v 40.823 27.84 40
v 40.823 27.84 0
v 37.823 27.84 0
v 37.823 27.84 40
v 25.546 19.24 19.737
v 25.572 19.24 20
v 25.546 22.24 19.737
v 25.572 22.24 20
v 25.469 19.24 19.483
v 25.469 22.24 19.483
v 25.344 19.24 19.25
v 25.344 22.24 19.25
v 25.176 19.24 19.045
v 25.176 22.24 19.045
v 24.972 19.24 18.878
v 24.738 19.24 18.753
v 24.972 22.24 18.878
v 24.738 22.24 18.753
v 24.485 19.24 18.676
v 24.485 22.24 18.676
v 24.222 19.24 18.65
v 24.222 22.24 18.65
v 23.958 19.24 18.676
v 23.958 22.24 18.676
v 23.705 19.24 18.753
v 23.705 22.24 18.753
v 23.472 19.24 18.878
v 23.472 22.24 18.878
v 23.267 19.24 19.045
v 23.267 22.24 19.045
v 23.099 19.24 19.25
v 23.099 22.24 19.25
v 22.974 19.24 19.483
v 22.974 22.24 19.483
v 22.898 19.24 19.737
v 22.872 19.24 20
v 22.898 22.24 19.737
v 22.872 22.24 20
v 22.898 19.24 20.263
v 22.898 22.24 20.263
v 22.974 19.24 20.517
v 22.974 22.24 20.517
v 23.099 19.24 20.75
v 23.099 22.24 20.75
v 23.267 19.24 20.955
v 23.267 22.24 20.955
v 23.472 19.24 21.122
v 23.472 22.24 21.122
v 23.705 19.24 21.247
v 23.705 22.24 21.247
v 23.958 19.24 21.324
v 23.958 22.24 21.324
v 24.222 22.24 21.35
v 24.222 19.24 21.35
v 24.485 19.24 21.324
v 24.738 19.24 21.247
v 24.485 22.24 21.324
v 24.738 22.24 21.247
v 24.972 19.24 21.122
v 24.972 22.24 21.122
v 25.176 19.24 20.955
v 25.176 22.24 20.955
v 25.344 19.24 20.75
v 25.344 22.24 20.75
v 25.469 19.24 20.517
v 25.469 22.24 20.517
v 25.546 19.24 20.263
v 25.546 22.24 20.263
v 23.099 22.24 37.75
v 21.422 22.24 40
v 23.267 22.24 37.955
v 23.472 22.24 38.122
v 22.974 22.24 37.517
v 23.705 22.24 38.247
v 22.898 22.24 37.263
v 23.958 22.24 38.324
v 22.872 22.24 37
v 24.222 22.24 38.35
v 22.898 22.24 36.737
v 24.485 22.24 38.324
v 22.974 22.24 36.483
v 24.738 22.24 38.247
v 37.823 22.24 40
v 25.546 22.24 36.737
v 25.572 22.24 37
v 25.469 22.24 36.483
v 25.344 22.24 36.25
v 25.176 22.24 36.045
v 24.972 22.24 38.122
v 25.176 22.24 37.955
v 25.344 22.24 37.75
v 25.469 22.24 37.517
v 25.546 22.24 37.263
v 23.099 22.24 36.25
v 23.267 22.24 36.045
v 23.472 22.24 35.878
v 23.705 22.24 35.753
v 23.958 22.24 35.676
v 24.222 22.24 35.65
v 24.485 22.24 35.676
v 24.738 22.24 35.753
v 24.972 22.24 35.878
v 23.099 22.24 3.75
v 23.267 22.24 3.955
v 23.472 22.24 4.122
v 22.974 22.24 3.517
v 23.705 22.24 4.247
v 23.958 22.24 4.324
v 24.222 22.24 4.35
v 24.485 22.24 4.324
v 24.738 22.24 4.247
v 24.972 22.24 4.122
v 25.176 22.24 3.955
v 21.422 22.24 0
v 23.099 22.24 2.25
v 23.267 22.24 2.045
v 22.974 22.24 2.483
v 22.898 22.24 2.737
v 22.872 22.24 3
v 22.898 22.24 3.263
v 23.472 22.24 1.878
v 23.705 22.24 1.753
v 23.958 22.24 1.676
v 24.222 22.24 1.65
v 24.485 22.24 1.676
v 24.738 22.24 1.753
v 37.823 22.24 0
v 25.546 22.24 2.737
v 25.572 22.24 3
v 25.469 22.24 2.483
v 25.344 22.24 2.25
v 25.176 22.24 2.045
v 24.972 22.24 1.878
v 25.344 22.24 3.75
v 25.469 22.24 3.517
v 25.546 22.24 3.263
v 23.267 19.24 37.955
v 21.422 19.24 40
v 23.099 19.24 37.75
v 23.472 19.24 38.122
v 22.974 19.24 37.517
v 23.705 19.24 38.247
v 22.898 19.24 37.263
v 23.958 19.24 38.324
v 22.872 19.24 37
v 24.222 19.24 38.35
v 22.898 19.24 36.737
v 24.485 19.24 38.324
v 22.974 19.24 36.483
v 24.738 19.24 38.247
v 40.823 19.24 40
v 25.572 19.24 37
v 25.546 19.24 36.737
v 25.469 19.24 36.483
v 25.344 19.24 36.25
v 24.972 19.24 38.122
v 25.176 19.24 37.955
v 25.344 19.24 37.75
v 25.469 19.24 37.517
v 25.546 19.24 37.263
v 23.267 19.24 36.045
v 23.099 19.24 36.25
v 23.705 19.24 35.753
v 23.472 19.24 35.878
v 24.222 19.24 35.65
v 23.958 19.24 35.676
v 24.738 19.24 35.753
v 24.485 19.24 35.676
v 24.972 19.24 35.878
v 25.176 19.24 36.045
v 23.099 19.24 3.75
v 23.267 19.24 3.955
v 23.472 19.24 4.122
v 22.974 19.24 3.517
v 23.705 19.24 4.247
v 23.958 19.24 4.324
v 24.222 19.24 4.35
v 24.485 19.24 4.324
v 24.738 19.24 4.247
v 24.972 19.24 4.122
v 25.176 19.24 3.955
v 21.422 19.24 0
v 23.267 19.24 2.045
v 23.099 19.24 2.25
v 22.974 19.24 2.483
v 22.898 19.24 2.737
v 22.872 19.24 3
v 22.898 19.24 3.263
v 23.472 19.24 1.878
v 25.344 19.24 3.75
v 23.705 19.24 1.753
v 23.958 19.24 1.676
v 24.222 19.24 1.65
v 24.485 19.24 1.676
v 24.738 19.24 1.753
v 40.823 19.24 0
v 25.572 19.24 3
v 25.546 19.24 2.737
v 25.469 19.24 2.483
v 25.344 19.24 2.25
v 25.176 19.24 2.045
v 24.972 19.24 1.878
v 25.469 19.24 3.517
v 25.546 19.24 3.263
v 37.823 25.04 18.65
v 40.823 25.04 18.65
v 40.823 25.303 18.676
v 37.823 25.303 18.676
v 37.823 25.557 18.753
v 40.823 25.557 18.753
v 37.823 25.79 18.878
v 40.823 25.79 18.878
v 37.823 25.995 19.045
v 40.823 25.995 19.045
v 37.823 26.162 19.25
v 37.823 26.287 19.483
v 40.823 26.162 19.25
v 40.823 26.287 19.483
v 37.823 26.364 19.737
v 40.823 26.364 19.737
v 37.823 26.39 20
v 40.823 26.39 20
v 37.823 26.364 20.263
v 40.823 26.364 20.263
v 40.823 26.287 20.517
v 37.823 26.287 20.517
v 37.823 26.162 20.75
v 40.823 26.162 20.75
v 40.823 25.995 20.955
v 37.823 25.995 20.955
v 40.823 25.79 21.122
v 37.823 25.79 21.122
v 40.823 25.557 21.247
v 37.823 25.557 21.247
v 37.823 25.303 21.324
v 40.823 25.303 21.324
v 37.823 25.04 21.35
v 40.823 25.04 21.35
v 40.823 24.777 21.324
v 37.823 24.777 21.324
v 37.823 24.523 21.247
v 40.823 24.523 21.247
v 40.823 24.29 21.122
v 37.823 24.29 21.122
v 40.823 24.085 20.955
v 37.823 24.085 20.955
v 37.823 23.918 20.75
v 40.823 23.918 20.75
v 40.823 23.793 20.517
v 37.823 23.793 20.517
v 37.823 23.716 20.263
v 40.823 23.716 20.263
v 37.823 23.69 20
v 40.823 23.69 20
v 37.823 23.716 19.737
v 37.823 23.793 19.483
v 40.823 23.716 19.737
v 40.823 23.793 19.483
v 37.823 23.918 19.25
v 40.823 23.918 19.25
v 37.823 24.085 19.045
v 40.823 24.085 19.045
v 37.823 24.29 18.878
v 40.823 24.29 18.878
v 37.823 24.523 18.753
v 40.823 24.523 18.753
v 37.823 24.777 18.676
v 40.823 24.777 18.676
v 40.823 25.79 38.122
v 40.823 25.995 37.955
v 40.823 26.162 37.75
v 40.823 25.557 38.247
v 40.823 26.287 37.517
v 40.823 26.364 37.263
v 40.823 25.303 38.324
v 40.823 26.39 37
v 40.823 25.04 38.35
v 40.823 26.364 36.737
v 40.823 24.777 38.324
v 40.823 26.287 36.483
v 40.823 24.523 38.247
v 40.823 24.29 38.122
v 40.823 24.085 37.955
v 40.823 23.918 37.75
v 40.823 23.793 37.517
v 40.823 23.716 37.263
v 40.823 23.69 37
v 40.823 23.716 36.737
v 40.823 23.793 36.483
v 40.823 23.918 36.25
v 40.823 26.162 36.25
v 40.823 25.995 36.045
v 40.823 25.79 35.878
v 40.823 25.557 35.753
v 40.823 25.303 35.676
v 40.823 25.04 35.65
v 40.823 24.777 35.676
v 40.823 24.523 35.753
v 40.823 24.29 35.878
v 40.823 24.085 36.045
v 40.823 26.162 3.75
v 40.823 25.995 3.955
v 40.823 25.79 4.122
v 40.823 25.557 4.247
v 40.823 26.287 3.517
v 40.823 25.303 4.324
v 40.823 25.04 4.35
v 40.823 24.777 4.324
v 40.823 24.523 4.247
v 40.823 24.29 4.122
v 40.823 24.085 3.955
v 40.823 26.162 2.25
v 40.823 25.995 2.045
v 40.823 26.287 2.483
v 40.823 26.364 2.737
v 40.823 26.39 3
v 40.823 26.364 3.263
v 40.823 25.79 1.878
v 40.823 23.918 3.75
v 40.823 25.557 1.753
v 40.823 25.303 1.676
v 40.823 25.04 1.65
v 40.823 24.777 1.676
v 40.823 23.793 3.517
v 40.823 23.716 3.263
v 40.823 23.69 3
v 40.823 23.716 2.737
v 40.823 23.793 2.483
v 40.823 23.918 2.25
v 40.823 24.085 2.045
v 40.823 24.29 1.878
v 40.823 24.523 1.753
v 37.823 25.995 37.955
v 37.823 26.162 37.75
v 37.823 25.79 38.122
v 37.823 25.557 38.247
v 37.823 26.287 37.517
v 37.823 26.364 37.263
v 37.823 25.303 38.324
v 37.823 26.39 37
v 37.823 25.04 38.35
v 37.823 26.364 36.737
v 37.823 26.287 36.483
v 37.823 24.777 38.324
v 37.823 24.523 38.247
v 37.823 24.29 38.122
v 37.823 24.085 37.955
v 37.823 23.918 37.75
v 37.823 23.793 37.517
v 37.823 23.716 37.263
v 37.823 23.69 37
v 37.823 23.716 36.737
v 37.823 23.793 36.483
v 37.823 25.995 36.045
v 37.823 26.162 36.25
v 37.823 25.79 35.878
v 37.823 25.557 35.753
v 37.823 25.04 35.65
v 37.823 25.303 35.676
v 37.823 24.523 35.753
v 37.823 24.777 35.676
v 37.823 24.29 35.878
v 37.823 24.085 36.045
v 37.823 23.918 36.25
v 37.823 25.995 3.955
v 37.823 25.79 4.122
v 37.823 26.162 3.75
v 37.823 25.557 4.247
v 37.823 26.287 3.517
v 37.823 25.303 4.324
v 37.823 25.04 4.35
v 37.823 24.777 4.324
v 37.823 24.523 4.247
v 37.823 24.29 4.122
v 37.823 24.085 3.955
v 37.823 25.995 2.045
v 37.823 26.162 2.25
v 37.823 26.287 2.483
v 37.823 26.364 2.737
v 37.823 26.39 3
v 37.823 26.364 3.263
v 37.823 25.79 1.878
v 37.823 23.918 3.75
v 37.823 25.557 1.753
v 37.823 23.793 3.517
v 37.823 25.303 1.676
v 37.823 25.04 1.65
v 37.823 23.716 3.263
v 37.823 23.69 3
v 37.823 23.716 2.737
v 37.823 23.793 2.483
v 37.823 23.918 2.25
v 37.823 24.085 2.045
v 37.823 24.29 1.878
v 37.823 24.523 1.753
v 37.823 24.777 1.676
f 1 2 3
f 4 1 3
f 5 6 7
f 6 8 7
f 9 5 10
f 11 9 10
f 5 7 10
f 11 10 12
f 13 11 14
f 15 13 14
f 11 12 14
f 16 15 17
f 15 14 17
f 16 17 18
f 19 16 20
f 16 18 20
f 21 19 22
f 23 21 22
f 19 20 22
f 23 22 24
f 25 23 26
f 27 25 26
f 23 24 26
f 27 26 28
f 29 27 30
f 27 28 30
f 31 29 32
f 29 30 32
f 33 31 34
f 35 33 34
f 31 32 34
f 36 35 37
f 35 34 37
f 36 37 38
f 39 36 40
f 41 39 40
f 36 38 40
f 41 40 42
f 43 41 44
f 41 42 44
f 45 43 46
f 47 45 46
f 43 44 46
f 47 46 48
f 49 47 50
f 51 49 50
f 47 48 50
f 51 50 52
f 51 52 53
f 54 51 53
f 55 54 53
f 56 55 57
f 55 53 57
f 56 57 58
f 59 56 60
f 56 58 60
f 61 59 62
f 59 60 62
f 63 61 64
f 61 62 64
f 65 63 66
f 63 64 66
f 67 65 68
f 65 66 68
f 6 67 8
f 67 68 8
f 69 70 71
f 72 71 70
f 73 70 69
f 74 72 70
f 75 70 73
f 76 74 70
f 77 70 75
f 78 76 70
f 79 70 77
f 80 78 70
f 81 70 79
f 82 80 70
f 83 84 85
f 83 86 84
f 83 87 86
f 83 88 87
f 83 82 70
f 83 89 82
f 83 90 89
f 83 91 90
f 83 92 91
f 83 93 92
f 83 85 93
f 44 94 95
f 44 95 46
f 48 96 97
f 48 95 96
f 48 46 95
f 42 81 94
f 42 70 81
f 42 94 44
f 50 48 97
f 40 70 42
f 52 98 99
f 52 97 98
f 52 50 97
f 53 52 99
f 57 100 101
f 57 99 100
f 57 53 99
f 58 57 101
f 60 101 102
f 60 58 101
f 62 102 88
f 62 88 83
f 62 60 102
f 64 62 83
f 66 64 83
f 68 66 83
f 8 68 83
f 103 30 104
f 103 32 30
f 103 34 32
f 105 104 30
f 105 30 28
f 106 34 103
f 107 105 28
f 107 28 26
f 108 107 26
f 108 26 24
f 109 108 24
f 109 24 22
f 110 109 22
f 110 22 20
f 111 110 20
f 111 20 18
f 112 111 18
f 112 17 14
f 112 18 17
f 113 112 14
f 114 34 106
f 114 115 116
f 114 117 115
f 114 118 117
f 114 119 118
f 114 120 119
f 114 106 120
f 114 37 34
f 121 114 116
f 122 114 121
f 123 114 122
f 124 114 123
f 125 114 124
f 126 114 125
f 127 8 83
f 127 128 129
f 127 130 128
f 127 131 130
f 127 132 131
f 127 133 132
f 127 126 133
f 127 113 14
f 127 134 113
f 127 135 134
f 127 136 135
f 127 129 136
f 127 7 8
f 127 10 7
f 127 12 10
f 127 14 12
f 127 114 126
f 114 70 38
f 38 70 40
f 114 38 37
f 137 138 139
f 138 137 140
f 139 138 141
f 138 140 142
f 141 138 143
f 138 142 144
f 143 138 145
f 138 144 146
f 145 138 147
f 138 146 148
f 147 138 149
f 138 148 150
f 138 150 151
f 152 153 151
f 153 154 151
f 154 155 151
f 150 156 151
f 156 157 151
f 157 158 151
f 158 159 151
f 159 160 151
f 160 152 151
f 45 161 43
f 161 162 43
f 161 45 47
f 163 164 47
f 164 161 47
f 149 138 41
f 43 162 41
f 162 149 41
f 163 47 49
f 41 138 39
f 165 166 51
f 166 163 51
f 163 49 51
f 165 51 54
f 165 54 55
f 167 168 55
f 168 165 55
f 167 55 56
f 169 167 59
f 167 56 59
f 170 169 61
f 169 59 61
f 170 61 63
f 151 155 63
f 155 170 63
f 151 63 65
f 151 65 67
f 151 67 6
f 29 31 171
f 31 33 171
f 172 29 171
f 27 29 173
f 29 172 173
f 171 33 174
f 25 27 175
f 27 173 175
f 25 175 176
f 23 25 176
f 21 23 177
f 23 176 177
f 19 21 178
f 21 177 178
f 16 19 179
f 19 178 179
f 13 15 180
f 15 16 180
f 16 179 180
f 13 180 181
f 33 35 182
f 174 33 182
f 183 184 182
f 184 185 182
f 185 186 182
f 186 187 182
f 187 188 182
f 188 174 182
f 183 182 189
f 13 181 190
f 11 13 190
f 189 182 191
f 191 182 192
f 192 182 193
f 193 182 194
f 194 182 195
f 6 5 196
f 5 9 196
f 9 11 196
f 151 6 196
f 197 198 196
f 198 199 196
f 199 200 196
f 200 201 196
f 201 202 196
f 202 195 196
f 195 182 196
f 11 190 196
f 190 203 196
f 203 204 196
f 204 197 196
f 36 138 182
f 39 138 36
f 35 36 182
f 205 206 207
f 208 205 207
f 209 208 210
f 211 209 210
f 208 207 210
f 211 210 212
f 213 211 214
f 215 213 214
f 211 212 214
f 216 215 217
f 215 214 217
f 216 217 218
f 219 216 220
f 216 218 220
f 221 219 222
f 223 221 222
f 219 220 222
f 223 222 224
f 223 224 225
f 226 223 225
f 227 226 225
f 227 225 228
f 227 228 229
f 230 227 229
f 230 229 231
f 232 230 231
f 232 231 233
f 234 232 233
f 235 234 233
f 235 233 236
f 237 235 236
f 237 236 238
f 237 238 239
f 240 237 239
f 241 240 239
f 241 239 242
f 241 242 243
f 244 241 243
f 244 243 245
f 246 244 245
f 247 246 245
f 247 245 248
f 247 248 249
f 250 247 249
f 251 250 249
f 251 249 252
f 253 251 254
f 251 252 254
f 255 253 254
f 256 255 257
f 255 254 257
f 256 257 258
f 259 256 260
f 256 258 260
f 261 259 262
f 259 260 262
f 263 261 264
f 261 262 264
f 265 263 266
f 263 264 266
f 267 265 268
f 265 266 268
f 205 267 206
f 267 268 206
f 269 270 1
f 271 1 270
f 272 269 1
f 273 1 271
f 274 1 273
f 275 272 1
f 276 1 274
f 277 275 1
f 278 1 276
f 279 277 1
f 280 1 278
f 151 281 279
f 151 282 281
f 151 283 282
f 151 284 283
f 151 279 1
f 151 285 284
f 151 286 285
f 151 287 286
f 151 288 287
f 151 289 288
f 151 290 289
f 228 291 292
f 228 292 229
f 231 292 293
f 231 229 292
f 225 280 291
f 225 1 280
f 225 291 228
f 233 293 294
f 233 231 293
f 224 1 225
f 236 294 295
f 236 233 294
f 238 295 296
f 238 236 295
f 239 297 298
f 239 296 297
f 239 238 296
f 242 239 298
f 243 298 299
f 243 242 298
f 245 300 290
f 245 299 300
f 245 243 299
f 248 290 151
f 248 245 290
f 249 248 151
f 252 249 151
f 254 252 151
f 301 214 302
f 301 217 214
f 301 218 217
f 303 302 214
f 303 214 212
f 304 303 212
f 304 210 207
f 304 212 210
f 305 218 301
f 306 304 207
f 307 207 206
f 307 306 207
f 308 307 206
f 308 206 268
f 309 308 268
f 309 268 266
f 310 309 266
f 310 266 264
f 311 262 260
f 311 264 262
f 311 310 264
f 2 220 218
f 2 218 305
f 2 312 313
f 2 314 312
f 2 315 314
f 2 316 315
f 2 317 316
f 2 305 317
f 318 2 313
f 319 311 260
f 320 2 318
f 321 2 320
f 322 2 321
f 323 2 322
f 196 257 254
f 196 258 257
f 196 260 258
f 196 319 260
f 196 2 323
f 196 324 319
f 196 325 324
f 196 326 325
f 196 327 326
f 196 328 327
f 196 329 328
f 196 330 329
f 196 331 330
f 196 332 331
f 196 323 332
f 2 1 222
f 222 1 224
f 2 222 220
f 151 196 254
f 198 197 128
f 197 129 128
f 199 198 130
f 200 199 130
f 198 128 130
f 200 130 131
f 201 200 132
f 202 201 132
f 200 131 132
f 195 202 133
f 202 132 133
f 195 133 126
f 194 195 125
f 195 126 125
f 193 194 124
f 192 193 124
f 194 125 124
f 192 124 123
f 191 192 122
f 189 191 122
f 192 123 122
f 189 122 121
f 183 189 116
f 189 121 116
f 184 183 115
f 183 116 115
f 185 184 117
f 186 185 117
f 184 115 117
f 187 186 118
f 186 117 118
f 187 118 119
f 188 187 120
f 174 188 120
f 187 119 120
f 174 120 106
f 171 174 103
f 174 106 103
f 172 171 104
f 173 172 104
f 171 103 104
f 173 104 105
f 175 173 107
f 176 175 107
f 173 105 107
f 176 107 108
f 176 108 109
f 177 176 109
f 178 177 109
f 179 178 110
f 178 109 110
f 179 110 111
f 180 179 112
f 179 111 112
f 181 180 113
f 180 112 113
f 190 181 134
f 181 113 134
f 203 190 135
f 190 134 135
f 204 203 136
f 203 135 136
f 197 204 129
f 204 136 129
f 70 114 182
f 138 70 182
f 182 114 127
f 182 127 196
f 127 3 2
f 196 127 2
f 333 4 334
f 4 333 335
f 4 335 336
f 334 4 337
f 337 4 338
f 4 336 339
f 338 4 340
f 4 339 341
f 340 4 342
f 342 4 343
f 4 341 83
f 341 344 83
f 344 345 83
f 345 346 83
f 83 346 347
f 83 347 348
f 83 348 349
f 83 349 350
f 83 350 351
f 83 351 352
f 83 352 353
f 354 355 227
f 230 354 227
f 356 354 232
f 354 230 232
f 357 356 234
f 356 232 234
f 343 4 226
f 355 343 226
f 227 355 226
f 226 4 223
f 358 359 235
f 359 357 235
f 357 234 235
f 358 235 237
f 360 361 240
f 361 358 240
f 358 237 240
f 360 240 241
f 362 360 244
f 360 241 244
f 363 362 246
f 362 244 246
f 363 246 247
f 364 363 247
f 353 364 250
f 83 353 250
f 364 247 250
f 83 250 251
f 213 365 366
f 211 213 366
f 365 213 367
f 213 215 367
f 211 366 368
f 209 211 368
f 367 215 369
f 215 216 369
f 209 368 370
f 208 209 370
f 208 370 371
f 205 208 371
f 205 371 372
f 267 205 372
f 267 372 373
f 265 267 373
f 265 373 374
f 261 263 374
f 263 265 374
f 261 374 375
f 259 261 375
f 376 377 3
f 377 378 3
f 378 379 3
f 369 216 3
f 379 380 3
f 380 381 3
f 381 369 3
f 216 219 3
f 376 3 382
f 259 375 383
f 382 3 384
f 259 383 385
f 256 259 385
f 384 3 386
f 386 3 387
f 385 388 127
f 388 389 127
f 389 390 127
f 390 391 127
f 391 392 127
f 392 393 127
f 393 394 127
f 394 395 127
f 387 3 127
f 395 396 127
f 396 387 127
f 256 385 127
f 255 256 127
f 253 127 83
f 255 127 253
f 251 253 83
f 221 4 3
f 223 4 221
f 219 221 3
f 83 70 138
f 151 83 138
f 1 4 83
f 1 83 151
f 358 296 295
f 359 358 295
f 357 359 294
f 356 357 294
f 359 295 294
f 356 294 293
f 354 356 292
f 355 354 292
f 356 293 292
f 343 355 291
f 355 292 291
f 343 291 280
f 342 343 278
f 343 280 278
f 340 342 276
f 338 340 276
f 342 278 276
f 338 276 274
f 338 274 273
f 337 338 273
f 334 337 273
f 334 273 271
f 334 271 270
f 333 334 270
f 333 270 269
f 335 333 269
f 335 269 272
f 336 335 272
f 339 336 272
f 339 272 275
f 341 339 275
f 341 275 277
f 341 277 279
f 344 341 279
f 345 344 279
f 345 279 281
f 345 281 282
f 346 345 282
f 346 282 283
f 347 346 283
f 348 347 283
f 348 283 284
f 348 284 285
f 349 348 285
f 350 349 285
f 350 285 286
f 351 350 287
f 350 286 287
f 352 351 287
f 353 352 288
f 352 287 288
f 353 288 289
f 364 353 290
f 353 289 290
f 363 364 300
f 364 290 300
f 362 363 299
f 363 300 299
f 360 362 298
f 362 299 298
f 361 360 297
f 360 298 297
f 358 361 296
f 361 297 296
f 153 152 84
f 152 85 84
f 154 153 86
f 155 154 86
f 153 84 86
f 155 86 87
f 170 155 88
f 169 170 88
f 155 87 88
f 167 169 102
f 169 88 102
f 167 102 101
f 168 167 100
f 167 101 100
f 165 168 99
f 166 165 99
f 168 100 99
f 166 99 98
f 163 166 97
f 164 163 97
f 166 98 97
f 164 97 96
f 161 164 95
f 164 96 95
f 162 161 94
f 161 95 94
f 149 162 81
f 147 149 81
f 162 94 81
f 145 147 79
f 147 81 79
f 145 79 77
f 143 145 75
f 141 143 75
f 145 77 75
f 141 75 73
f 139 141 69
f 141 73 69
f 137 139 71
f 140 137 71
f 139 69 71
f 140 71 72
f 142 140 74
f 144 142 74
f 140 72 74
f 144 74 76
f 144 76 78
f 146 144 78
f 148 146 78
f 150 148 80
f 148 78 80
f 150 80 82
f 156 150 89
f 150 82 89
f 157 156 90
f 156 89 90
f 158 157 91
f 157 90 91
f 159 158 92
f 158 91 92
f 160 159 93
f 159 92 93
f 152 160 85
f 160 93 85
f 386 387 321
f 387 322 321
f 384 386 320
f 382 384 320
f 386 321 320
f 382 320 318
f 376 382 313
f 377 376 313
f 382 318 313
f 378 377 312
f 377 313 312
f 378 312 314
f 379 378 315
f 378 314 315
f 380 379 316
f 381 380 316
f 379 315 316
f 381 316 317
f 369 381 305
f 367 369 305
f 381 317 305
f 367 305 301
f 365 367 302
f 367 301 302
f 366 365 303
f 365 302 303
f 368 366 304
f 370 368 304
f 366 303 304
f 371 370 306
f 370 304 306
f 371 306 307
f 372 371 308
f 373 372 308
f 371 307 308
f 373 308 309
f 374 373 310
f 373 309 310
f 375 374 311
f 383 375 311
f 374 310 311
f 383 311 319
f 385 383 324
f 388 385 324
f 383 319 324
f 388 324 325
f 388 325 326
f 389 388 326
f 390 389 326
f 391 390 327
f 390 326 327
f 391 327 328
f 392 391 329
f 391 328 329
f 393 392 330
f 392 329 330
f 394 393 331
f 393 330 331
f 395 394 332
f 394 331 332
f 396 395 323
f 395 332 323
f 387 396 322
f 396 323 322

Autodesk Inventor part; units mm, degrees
ref_plane "YZ Plane" through (0, 0, 0) normal (1, 0, 0) x (0, 1, 0)
ref_plane "XZ Plane" through (0, 0, 0) normal (0, 1, 0) x (-1, 0, 0)
ref_plane "XY Plane" through (0, 0, 0) normal (0, 0, 1) x (1, 0, 0)
sketch "Sketch1" plane through (0, 0, 0) normal (0, 0, 1) x (1, 0, 0)
  line L0 (21.4217, 22.24) -> (21.4217, 19.24)
  line L1 (21.4217, 22.24) -> (37.8228, 22.24)
  line L2 (21.4217, 19.24) -> (40.8228, 19.24)
  line L3 (40.8228, 27.84) -> (37.8228, 27.84)
  line L4 (37.8228, 27.84) -> (37.8228, 22.24)
  line L5 (40.8228, 27.84) -> (40.8228, 19.24)
  point P0 (0, 0)
extrude "Extrusion1" add sketch "Sketch1" along normal blind 40
sketch "Sketch2" plane through (40.8228, 19.24, 0) normal (1, 0, 0) x (0, 0, -1)
  line L0 (-40, 8.6) -> (-40, 0) projected
  line L1 (0, 8.6) -> (-40, 8.6) projected
  circle A0 centre (-37, 5.8) radius 1.35
  circle A1 centre (-20, 5.8) radius 1.35
  circle A2 centre (-3, 5.8) radius 1.35
  point P0 (0, -19.24)
  dimension "d2" = 2.7
  dimension "d3" = 2.7
  dimension "d4" = 2.8
  dimension "d5" = 2.8
  dimension "d6" = 17
  dimension "d7" = 2.7
  dimension "d8" = 17
  dimension "d9" = 3
extrude "Extrusion2" cut sketch "Sketch2" against normal through all
sketch "Sketch3" plane through (21.4217, 22.24, 0) normal (0, 1, 0) x (1, 0, 0)
  line L0 (16.4011, 0) -> (0, 0) projected
  line L1 (0, 0) -> (0, -40) projected
  circle A0 centre (2.8, -3) radius 1.35
  circle A1 centre (2.8, -20) radius 1.35
  circle A2 centre (2.8, -37) radius 1.35
  point P0 (-21.4217, 0)
  dimension "d12" = 2.7
  dimension "d13" = 3
  dimension "d14" = 2.8
  dimension "d15" = 2.7
  dimension "d16" = 2.7
  dimension "d17" = 17
  dimension "d18" = 17
extrude "Extrusion3" cut sketch "Sketch3" against normal through all
properties part number "Groin" material "Aluminum-6061"
